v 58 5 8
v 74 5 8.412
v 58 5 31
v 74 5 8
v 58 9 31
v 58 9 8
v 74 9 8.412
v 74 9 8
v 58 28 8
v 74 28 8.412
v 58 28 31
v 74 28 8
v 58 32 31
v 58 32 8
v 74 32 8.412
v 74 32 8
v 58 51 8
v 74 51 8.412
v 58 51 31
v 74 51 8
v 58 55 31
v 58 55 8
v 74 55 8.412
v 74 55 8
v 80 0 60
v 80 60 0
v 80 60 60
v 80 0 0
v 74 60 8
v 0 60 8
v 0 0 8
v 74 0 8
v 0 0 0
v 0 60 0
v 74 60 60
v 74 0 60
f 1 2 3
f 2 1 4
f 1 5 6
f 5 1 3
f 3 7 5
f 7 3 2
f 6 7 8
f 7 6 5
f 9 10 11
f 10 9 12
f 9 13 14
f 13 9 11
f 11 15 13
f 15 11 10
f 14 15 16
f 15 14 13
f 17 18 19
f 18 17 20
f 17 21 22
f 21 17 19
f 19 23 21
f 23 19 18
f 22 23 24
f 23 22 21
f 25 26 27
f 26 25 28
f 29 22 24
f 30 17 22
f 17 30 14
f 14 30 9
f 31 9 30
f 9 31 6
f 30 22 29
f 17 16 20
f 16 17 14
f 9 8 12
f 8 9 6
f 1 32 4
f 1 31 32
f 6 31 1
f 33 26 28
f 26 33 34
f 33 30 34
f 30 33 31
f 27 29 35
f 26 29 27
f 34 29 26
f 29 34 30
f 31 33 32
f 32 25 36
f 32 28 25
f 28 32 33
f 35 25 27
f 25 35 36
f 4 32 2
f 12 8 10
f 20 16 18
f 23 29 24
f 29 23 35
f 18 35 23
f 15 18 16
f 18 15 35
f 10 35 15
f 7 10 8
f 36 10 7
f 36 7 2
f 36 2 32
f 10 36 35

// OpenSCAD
$fn = 32;
// target_bbox: 80, 60, 60
// ----------------------------------------------------------------------
// Rib bracket: 3-gusset L bracket
// ----------------------------------------------------------------------

// --- parameters (mm) ---
base_l = 80;              // foot length, X
base_w = 60;              // foot width, Y
base_t = 8;               // foot thickness
plate_t = 6;              // upright plate thickness
plate_h = 60;             // overall height
gus_l = 16;               // gusset leg along the foot
gus_h = 24;               // gusset height
gus_t = 4;                // gusset thickness
gus_edge = 5;             // gusset margin from the foot edge
n_gus = 3;                // gusset count

gus_pitch = (base_w - 2 * gus_edge - gus_t) / (n_gus - 1);  // gusset pitch

union() {
  cube([base_l, base_w, base_t]);
  translate([base_l - plate_t, 0, base_t - 1])
    cube([plate_t, base_w, plate_h - base_t + 1]);
  for (i = [0 : n_gus - 1])
    translate([base_l - plate_t - gus_l, gus_edge + i * gus_pitch, base_t - 1])
      rotate([-90, 0, 0])
        linear_extrude(height = gus_t)
          polygon(points = [[0, 0], [gus_l + 1, 0], [0, -gus_h]]);
}
